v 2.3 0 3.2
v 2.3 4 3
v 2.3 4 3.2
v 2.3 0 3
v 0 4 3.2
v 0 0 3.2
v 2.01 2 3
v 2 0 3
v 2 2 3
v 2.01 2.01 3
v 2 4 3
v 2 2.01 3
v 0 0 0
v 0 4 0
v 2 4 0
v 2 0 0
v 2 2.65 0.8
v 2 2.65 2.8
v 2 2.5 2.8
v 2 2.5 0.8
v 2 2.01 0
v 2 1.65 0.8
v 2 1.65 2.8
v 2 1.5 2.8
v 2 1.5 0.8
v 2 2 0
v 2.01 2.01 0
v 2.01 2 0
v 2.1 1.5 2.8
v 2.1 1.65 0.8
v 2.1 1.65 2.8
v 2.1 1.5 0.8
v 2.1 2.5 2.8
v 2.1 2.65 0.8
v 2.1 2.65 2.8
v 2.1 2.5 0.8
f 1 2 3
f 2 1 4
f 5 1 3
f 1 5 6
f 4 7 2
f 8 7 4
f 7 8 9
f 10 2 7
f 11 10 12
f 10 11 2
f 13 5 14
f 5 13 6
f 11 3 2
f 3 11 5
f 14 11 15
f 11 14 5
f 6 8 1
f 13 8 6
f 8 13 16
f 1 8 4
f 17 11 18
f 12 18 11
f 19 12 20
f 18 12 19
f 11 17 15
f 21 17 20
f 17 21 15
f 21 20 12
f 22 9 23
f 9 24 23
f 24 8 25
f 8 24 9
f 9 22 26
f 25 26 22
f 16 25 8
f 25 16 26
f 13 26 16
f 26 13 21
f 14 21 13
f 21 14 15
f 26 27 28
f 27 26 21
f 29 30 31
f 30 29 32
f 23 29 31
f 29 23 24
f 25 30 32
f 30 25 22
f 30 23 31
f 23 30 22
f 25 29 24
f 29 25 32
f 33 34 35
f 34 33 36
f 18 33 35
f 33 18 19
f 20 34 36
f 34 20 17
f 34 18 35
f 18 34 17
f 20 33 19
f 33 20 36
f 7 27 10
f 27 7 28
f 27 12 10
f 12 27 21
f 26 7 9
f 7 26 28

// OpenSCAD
translate([0,0,3])
color("#c2c2c2")
cube([2.3,4,0.2]);

color("#9e9e9e")
cube([2,4,3]);

translate([2,1.5,0.8])
color("#c2c2c2")
cube([0.1,0.15,2]);


translate([2,2.5,0.8])
color("#c2c2c2")
cube([0.1,0.15,2]);


translate([2,2,0])
color("#000000")
cube([0.01,0.01,3]);
